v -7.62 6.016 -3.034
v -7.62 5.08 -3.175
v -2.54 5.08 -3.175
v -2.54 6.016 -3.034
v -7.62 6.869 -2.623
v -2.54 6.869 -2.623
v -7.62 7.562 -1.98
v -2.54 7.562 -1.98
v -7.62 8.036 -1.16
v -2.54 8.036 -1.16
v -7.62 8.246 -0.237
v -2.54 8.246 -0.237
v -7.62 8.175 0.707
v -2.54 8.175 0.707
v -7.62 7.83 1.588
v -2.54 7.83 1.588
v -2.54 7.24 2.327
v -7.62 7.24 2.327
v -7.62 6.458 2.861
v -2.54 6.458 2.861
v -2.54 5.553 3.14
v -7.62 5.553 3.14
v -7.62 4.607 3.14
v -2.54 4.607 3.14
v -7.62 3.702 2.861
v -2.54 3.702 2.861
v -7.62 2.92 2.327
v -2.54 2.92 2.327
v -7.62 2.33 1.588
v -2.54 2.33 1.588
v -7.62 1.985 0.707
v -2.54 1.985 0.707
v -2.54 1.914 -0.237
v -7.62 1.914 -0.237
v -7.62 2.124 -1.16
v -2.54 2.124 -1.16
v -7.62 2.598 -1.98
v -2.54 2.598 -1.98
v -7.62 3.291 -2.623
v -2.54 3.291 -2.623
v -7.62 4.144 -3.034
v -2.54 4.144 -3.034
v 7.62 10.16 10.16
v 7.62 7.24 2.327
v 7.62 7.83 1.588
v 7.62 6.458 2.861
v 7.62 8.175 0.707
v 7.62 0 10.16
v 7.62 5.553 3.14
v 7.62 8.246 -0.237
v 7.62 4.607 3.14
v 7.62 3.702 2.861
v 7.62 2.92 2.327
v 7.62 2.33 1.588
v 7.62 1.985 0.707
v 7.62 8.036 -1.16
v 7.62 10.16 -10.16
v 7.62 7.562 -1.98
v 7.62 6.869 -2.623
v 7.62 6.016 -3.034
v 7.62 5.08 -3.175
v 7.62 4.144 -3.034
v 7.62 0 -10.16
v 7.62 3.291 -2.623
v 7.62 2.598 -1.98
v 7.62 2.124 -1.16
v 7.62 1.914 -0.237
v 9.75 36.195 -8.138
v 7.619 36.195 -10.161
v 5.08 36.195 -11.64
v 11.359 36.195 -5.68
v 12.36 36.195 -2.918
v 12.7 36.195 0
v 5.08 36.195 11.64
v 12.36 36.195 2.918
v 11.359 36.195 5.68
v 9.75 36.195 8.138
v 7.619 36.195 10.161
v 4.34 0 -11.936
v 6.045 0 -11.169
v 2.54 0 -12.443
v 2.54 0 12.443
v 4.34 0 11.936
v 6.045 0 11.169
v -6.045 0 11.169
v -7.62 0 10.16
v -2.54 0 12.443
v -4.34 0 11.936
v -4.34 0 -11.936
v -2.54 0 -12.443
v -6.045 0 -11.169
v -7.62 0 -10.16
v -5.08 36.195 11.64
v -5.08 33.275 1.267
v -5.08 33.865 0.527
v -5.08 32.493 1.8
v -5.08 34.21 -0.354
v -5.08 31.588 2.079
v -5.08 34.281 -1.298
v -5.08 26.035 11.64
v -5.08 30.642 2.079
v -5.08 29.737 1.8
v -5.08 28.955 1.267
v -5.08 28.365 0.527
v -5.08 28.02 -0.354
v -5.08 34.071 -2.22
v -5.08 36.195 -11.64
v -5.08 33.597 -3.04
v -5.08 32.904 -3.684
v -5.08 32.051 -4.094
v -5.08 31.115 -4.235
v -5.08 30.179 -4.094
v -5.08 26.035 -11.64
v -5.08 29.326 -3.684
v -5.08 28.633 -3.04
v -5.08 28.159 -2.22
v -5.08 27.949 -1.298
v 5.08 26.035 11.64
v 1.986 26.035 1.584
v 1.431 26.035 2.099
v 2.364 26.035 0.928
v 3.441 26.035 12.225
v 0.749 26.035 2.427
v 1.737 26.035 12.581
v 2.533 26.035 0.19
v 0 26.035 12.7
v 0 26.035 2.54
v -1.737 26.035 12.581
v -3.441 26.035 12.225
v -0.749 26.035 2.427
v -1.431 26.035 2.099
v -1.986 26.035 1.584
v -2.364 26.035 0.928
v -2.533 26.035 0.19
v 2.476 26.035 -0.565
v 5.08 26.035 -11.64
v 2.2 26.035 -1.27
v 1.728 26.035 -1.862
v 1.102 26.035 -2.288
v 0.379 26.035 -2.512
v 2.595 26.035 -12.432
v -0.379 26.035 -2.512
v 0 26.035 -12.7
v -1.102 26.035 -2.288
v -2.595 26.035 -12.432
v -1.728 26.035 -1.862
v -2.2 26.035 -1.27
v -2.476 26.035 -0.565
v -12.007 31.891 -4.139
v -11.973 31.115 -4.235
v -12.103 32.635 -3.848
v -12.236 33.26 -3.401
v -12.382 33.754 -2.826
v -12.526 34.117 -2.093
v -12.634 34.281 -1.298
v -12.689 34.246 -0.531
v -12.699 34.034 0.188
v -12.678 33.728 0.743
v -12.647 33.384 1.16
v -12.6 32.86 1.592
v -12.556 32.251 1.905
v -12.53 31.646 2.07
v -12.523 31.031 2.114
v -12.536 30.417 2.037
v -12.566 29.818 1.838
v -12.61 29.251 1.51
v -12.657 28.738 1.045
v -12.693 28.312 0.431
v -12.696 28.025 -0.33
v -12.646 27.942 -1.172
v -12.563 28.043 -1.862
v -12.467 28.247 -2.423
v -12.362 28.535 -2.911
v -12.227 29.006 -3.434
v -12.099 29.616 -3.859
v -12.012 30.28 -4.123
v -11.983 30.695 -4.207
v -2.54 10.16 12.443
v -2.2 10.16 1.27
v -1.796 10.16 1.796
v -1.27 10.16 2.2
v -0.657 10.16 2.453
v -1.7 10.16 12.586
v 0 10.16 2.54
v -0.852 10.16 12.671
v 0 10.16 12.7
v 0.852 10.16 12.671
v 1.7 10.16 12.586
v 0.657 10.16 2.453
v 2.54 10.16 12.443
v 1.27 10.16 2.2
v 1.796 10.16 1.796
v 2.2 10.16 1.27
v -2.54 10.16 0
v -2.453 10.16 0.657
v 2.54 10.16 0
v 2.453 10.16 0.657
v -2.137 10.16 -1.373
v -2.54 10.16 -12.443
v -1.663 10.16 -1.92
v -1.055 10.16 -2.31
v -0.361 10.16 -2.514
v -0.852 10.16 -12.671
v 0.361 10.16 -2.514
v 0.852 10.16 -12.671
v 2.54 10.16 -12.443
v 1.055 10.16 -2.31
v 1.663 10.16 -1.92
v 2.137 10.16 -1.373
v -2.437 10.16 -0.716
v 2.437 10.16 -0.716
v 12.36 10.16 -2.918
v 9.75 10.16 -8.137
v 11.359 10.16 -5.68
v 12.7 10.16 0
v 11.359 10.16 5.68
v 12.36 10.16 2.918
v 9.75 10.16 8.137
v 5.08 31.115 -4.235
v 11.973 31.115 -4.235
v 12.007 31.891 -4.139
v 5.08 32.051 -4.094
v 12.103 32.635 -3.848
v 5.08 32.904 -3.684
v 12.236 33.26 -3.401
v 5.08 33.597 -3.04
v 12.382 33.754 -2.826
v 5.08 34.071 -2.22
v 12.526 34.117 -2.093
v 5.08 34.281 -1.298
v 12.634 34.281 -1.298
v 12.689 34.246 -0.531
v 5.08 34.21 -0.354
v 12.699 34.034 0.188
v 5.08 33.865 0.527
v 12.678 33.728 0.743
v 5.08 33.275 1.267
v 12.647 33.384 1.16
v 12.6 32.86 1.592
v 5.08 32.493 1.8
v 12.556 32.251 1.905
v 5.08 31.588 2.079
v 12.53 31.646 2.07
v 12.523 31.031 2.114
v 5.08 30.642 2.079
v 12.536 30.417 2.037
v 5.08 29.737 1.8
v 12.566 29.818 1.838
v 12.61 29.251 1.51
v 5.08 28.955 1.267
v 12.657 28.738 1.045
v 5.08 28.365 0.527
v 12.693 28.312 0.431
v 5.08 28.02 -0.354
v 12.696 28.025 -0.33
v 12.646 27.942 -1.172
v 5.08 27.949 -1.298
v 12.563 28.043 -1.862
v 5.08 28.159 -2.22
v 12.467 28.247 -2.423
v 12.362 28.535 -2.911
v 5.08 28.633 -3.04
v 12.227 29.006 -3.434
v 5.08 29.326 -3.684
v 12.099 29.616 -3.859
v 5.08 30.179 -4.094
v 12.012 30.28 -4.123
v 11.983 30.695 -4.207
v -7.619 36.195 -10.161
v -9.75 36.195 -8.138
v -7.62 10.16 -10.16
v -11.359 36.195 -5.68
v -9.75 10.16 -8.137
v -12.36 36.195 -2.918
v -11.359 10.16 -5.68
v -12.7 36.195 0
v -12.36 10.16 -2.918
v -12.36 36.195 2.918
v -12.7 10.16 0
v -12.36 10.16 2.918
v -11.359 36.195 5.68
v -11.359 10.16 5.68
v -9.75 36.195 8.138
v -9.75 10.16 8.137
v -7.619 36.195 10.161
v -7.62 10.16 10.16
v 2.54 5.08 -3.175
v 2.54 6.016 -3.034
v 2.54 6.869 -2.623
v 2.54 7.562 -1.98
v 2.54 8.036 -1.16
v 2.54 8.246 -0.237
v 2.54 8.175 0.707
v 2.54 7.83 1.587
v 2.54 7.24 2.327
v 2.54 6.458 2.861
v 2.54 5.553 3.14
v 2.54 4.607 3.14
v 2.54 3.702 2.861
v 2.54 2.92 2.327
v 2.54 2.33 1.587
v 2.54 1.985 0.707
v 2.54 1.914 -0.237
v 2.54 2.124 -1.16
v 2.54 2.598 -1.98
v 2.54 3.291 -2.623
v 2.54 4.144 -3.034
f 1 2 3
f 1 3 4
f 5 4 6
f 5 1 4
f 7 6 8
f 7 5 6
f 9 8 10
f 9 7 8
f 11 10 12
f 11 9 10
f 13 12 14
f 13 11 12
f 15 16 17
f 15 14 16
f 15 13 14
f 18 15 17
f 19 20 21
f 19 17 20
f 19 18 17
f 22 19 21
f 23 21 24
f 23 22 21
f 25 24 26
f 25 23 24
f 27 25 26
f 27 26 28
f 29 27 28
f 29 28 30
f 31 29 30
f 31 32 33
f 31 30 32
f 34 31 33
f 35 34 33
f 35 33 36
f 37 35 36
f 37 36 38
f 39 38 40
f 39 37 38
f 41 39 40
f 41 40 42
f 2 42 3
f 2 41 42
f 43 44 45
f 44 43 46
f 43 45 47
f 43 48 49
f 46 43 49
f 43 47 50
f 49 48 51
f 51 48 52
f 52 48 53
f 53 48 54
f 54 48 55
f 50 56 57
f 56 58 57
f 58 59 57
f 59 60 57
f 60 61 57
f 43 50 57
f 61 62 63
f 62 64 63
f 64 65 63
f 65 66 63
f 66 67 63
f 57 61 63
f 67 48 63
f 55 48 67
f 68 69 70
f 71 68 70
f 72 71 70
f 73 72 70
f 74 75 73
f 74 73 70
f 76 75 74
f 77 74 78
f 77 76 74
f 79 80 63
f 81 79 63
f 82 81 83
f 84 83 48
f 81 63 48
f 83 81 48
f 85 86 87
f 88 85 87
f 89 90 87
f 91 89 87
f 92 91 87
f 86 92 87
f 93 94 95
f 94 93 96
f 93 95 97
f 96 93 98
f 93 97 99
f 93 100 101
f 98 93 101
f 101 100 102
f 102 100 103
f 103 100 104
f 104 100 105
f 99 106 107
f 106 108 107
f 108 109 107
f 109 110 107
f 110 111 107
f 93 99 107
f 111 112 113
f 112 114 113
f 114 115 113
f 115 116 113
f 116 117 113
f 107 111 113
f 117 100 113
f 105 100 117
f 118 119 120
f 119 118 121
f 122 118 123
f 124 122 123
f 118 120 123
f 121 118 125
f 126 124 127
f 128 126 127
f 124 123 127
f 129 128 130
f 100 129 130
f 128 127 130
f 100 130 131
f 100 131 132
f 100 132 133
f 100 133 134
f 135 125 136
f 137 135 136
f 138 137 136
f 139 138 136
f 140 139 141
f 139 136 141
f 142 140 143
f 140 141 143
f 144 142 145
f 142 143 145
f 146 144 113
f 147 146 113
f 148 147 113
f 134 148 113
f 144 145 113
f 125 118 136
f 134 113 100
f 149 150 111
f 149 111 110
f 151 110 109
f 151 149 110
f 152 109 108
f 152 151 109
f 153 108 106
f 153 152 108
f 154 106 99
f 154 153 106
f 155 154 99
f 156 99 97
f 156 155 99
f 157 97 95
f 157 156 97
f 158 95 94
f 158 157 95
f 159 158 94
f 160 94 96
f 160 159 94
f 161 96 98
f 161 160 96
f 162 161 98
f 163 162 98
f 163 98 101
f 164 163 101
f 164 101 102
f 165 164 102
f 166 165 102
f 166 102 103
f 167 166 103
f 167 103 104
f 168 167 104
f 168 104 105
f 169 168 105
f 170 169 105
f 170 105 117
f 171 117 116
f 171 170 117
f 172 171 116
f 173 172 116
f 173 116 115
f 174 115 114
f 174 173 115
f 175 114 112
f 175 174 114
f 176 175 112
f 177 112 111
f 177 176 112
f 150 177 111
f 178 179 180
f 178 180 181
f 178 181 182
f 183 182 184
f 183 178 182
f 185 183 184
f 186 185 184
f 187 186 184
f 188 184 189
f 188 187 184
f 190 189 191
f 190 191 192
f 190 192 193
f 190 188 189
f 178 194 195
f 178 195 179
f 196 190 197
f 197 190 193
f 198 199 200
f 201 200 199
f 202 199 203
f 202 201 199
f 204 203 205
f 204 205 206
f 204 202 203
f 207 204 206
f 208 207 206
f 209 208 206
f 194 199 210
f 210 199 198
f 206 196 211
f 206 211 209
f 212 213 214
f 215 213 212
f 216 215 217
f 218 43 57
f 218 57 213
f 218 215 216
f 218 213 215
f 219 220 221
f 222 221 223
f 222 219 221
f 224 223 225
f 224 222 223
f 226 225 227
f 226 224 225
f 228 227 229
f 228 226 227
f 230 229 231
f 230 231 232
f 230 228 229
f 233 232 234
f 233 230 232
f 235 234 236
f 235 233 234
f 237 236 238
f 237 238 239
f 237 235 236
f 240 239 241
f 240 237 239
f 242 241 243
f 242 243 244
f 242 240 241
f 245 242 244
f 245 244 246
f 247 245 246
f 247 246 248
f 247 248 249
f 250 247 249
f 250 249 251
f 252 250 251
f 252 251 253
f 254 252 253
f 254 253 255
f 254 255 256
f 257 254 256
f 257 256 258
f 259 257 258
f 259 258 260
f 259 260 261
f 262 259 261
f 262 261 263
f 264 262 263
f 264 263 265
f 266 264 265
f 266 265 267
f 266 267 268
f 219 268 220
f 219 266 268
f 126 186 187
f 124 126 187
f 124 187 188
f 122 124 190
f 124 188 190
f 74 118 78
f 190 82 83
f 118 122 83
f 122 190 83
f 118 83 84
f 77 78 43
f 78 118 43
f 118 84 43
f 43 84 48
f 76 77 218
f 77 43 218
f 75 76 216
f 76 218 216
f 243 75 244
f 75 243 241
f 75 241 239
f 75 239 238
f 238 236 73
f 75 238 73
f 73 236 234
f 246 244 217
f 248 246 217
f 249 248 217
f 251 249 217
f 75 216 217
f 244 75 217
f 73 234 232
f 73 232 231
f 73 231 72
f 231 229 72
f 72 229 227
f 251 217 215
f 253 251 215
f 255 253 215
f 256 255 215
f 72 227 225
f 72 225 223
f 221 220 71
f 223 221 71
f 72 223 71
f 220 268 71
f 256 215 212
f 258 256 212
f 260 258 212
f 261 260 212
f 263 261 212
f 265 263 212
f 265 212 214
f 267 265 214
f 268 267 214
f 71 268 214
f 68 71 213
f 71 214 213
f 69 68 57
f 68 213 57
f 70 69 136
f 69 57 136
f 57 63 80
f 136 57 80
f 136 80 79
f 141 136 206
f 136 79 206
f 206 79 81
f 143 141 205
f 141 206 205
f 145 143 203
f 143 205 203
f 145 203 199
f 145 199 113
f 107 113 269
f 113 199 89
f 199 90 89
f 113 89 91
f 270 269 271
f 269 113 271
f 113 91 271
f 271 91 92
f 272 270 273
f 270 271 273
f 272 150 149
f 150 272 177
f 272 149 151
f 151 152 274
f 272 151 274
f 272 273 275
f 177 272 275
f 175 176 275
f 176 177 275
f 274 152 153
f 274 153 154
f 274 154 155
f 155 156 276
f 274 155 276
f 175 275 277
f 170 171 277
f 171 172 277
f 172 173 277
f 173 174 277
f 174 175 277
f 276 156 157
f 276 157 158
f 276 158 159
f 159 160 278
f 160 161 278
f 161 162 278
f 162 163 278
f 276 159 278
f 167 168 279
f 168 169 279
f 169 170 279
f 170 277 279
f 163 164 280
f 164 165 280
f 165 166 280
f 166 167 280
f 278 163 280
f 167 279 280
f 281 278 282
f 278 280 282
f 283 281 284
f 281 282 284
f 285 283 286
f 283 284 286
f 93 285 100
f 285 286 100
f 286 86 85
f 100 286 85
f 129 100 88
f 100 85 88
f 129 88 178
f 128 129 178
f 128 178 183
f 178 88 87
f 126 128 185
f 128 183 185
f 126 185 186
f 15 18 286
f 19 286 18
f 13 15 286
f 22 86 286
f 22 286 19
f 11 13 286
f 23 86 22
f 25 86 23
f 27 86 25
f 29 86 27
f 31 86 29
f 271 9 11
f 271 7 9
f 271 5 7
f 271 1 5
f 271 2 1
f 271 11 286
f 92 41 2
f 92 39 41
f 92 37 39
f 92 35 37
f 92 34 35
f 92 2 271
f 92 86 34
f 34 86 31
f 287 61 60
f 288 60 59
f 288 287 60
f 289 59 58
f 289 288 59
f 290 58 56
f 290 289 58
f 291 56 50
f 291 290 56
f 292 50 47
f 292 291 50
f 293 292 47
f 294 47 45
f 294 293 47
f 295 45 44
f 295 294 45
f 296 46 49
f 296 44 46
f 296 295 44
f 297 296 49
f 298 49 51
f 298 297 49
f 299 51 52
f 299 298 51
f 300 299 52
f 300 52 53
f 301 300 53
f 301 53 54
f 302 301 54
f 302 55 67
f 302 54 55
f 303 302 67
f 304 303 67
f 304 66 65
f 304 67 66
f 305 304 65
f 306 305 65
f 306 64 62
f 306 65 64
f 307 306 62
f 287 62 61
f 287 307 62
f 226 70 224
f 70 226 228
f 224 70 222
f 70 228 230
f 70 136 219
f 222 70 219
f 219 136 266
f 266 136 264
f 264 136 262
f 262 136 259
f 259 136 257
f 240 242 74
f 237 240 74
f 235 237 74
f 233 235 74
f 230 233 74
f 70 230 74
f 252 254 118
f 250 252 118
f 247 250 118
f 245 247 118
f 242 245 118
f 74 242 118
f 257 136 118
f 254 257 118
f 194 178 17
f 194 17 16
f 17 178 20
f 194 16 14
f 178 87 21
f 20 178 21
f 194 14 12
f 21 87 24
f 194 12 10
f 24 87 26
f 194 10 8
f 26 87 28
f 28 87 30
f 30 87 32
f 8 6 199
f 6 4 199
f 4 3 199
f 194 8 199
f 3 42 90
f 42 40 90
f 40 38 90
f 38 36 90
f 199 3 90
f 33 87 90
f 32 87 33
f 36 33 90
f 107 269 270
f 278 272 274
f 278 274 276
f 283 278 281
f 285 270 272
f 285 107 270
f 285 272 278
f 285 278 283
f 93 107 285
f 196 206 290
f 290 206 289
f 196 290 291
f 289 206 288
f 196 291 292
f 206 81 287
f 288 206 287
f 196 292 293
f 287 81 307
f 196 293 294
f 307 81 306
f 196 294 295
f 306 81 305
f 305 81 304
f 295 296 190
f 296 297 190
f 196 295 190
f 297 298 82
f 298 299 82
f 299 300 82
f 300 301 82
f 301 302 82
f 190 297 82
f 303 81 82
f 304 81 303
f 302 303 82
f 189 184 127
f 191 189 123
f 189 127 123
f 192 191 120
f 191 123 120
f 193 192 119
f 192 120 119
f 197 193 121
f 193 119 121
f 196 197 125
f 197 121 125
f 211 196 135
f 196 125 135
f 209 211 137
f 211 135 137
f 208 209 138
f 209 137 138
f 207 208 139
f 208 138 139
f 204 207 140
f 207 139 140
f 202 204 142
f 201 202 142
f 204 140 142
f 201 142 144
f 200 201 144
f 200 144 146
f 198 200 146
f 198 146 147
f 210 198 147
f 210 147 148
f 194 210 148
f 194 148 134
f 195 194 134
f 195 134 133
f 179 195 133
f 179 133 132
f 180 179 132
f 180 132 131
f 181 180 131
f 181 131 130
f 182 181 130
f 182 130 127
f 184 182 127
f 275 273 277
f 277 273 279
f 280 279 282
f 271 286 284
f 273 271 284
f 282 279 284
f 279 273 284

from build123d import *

# Parameters (mm, degrees)
SKETCH1_R               = 12.7
BOSS_EXTRUDE1_DEPTH     = 36.195
CUT_EXTRUDE1_START      = -10.16
CUT_EXTRUDE1_DEPTH      = 10.16
CUT_EXTRUDE2_DEPTH      = 10.16
CUT_EXTRUDE3_DEPTH      = 43.278794034
CUT_EXTRUDE3_DEPTH_BACK = 43.278794034
SKETCH4_R               = 3.175
SKETCH5_R               = 2.54
CUT_EXTRUDE4_DEPTH      = 32.629120053


with BuildPart() as part:
    # Sketch1 → Boss-Extrude1 (new body)
    with BuildSketch(Plane(origin=(0, 0, 0), x_dir=(1, 0, 0), z_dir=(0, 1, 0))):
        with Locations(Location((0, 0, 0), (0, 0, 270))):
            Circle(SKETCH1_R)
    extrude(amount=BOSS_EXTRUDE1_DEPTH)

    # Sketch2 → Cut-Extrude1 (cut)
    with BuildSketch(Plane(origin=(0, 36.195, 0), x_dir=(1, 0, 0), z_dir=(0, 1, 0)).offset(CUT_EXTRUDE1_START)):
        with BuildLine():
            Line((5.08, 11.639742265), (5.08, -11.639742265))
            ThreePointArc((5.08, -11.639742265), (0, -12.7), (-5.08, -11.639742265))
            Line((-5.08, -11.639742265), (-5.08, 11.639742265))
            ThreePointArc((-5.08, 11.639742265), (0, 12.7), (5.08, 11.639742265))
        make_face()
    extrude(amount=CUT_EXTRUDE1_DEPTH, mode=Mode.SUBTRACT)

    # Sketch3 → Cut-Extrude2 (cut)
    with BuildSketch(Plane.XZ):
        with BuildLine():
            Line((-2.54, 12.443407893), (-2.54, -12.443407893))
            ThreePointArc((-2.54, -12.443407893), (0, -12.7), (2.54, -12.443407893))
            Line((2.54, -12.443407893), (2.54, 12.443407893))
            ThreePointArc((2.54, 12.443407893), (0, 12.7), (-2.54, 12.443407893))
        make_face()
        with BuildLine():
            Line((-7.62, 10.16), (-7.62, -10.16))
            ThreePointArc((-7.62, -10.16), (-12.7, 0), (-7.62, 10.16))
        make_face()
        with BuildLine():
            Line((7.62, 10.16), (7.62, -10.16))
            ThreePointArc((7.62, -10.16), (12.7, 0), (7.62, 10.16))
        make_face()
    extrude(amount=-CUT_EXTRUDE2_DEPTH, mode=Mode.SUBTRACT)

    # Sketch4 → Cut-Extrude3 (cut, two sides: drawn at the far end of the back side and taken through both)
    with BuildSketch(Plane(origin=(-5.08, 0, 0), x_dir=(0, 0, -1), z_dir=(1, 0, 0)).offset(-CUT_EXTRUDE3_DEPTH_BACK)):
        with Locations((1.060257735, 31.115)):
            Circle(SKETCH4_R)
        with Locations((0, 5.08)):
            Circle(SKETCH4_R)
    extrude(amount=CUT_EXTRUDE3_DEPTH + CUT_EXTRUDE3_DEPTH_BACK, mode=Mode.SUBTRACT)

    # Sketch5 → Cut-Extrude4 (cut, through all)
    with BuildSketch(Plane(origin=(0, 26.035, 0), x_dir=(1, 0, 0), z_dir=(0, 1, 0))):
        with Locations(Location((0, 0, 0), (0, 0, 270))):
            Circle(SKETCH5_R)
    extrude(amount=-CUT_EXTRUDE4_DEPTH, mode=Mode.SUBTRACT)


solid = part.part
